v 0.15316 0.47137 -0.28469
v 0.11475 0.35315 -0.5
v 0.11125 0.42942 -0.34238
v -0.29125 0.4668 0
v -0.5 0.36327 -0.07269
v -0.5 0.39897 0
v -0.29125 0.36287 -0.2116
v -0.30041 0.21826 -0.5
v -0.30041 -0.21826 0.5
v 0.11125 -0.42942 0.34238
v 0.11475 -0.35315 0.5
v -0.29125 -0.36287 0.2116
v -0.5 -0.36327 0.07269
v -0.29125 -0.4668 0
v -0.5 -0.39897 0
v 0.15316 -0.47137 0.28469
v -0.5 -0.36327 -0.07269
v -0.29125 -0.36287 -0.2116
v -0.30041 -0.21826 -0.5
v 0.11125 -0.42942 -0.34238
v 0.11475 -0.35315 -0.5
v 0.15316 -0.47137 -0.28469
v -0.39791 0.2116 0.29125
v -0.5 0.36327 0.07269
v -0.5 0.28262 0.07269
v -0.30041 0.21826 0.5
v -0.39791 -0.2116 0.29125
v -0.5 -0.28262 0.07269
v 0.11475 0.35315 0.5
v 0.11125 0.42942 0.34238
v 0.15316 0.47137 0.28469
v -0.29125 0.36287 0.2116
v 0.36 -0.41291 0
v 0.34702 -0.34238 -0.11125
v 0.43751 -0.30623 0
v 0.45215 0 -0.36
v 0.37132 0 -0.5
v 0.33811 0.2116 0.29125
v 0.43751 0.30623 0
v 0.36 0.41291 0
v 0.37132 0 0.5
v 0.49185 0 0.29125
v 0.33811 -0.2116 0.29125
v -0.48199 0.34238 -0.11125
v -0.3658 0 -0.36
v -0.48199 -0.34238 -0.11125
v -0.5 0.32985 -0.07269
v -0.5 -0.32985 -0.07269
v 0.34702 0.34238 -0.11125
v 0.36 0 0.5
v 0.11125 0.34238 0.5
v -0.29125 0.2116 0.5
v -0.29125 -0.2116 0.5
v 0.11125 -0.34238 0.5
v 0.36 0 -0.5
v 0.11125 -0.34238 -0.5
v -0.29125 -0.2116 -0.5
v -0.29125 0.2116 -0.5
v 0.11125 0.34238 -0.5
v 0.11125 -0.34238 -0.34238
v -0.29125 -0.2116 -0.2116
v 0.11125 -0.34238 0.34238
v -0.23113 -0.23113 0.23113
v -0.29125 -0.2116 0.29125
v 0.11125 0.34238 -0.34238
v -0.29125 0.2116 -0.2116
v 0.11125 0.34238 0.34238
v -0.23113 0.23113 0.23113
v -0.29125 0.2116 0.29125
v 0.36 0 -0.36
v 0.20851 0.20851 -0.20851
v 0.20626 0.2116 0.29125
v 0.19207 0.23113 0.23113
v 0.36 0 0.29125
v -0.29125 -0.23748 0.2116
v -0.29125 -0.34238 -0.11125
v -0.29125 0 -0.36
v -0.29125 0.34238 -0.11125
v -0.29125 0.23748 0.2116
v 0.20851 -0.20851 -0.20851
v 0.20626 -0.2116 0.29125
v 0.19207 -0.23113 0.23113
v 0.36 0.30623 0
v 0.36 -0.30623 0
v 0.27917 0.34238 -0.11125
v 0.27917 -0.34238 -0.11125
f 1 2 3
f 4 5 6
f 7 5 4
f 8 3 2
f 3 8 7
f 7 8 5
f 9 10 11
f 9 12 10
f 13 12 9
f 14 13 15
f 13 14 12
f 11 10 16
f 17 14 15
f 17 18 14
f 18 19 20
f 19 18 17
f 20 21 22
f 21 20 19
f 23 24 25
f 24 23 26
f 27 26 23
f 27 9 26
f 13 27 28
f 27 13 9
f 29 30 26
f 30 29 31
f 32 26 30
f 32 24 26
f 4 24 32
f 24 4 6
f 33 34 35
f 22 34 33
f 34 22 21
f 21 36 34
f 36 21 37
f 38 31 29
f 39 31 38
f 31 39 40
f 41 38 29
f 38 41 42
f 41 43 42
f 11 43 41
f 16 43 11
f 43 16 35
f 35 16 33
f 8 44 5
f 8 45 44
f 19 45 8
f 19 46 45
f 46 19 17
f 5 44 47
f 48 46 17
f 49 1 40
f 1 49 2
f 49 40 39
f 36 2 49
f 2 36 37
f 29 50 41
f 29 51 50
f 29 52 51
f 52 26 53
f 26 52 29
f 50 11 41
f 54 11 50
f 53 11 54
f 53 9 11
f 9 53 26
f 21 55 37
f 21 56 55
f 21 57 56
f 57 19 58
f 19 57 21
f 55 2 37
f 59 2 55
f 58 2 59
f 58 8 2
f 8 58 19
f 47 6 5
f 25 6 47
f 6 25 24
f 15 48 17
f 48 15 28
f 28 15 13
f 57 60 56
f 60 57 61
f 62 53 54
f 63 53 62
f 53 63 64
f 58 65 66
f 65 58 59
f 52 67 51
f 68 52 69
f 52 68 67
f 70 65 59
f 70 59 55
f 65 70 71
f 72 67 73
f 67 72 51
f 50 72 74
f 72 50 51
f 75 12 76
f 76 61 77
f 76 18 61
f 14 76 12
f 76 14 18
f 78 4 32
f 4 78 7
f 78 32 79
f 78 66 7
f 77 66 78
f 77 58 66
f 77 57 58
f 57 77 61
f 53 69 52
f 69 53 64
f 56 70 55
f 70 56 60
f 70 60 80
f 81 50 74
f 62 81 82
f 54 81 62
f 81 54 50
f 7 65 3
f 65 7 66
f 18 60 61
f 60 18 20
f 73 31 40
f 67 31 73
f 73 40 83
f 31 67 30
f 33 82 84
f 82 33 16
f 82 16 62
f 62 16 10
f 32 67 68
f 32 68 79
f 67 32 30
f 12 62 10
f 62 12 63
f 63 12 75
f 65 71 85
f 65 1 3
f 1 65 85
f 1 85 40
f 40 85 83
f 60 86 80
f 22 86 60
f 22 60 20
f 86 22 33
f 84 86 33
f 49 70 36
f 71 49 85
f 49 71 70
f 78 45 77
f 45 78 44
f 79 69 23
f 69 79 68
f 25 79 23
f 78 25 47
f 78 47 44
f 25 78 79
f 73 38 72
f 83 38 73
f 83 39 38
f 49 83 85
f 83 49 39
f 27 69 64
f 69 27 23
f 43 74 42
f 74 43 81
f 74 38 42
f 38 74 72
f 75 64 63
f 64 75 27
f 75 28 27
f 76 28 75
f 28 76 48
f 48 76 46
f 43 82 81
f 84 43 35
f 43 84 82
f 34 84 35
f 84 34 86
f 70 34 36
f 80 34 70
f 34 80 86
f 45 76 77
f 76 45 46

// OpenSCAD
difference(){

intersection(){
        sphere(0.66);
translate([-0.5,-0.5,-0.5]){
cube(1);
}
}
union(){

union(){
translate([0,0.0,-1.0]){
    cylinder(2,0.36,0.36);
}

rotate([90,0,0]){
    translate([0,0.0,-1.0]){
        cylinder(2,0.36,0.36);
    }
}
}
color([1,0,0])
rotate([0,90,0]){
    translate([0,0.0,-1.0]){
        cylinder(2,0.36,0.36);
    }
}
}

}
